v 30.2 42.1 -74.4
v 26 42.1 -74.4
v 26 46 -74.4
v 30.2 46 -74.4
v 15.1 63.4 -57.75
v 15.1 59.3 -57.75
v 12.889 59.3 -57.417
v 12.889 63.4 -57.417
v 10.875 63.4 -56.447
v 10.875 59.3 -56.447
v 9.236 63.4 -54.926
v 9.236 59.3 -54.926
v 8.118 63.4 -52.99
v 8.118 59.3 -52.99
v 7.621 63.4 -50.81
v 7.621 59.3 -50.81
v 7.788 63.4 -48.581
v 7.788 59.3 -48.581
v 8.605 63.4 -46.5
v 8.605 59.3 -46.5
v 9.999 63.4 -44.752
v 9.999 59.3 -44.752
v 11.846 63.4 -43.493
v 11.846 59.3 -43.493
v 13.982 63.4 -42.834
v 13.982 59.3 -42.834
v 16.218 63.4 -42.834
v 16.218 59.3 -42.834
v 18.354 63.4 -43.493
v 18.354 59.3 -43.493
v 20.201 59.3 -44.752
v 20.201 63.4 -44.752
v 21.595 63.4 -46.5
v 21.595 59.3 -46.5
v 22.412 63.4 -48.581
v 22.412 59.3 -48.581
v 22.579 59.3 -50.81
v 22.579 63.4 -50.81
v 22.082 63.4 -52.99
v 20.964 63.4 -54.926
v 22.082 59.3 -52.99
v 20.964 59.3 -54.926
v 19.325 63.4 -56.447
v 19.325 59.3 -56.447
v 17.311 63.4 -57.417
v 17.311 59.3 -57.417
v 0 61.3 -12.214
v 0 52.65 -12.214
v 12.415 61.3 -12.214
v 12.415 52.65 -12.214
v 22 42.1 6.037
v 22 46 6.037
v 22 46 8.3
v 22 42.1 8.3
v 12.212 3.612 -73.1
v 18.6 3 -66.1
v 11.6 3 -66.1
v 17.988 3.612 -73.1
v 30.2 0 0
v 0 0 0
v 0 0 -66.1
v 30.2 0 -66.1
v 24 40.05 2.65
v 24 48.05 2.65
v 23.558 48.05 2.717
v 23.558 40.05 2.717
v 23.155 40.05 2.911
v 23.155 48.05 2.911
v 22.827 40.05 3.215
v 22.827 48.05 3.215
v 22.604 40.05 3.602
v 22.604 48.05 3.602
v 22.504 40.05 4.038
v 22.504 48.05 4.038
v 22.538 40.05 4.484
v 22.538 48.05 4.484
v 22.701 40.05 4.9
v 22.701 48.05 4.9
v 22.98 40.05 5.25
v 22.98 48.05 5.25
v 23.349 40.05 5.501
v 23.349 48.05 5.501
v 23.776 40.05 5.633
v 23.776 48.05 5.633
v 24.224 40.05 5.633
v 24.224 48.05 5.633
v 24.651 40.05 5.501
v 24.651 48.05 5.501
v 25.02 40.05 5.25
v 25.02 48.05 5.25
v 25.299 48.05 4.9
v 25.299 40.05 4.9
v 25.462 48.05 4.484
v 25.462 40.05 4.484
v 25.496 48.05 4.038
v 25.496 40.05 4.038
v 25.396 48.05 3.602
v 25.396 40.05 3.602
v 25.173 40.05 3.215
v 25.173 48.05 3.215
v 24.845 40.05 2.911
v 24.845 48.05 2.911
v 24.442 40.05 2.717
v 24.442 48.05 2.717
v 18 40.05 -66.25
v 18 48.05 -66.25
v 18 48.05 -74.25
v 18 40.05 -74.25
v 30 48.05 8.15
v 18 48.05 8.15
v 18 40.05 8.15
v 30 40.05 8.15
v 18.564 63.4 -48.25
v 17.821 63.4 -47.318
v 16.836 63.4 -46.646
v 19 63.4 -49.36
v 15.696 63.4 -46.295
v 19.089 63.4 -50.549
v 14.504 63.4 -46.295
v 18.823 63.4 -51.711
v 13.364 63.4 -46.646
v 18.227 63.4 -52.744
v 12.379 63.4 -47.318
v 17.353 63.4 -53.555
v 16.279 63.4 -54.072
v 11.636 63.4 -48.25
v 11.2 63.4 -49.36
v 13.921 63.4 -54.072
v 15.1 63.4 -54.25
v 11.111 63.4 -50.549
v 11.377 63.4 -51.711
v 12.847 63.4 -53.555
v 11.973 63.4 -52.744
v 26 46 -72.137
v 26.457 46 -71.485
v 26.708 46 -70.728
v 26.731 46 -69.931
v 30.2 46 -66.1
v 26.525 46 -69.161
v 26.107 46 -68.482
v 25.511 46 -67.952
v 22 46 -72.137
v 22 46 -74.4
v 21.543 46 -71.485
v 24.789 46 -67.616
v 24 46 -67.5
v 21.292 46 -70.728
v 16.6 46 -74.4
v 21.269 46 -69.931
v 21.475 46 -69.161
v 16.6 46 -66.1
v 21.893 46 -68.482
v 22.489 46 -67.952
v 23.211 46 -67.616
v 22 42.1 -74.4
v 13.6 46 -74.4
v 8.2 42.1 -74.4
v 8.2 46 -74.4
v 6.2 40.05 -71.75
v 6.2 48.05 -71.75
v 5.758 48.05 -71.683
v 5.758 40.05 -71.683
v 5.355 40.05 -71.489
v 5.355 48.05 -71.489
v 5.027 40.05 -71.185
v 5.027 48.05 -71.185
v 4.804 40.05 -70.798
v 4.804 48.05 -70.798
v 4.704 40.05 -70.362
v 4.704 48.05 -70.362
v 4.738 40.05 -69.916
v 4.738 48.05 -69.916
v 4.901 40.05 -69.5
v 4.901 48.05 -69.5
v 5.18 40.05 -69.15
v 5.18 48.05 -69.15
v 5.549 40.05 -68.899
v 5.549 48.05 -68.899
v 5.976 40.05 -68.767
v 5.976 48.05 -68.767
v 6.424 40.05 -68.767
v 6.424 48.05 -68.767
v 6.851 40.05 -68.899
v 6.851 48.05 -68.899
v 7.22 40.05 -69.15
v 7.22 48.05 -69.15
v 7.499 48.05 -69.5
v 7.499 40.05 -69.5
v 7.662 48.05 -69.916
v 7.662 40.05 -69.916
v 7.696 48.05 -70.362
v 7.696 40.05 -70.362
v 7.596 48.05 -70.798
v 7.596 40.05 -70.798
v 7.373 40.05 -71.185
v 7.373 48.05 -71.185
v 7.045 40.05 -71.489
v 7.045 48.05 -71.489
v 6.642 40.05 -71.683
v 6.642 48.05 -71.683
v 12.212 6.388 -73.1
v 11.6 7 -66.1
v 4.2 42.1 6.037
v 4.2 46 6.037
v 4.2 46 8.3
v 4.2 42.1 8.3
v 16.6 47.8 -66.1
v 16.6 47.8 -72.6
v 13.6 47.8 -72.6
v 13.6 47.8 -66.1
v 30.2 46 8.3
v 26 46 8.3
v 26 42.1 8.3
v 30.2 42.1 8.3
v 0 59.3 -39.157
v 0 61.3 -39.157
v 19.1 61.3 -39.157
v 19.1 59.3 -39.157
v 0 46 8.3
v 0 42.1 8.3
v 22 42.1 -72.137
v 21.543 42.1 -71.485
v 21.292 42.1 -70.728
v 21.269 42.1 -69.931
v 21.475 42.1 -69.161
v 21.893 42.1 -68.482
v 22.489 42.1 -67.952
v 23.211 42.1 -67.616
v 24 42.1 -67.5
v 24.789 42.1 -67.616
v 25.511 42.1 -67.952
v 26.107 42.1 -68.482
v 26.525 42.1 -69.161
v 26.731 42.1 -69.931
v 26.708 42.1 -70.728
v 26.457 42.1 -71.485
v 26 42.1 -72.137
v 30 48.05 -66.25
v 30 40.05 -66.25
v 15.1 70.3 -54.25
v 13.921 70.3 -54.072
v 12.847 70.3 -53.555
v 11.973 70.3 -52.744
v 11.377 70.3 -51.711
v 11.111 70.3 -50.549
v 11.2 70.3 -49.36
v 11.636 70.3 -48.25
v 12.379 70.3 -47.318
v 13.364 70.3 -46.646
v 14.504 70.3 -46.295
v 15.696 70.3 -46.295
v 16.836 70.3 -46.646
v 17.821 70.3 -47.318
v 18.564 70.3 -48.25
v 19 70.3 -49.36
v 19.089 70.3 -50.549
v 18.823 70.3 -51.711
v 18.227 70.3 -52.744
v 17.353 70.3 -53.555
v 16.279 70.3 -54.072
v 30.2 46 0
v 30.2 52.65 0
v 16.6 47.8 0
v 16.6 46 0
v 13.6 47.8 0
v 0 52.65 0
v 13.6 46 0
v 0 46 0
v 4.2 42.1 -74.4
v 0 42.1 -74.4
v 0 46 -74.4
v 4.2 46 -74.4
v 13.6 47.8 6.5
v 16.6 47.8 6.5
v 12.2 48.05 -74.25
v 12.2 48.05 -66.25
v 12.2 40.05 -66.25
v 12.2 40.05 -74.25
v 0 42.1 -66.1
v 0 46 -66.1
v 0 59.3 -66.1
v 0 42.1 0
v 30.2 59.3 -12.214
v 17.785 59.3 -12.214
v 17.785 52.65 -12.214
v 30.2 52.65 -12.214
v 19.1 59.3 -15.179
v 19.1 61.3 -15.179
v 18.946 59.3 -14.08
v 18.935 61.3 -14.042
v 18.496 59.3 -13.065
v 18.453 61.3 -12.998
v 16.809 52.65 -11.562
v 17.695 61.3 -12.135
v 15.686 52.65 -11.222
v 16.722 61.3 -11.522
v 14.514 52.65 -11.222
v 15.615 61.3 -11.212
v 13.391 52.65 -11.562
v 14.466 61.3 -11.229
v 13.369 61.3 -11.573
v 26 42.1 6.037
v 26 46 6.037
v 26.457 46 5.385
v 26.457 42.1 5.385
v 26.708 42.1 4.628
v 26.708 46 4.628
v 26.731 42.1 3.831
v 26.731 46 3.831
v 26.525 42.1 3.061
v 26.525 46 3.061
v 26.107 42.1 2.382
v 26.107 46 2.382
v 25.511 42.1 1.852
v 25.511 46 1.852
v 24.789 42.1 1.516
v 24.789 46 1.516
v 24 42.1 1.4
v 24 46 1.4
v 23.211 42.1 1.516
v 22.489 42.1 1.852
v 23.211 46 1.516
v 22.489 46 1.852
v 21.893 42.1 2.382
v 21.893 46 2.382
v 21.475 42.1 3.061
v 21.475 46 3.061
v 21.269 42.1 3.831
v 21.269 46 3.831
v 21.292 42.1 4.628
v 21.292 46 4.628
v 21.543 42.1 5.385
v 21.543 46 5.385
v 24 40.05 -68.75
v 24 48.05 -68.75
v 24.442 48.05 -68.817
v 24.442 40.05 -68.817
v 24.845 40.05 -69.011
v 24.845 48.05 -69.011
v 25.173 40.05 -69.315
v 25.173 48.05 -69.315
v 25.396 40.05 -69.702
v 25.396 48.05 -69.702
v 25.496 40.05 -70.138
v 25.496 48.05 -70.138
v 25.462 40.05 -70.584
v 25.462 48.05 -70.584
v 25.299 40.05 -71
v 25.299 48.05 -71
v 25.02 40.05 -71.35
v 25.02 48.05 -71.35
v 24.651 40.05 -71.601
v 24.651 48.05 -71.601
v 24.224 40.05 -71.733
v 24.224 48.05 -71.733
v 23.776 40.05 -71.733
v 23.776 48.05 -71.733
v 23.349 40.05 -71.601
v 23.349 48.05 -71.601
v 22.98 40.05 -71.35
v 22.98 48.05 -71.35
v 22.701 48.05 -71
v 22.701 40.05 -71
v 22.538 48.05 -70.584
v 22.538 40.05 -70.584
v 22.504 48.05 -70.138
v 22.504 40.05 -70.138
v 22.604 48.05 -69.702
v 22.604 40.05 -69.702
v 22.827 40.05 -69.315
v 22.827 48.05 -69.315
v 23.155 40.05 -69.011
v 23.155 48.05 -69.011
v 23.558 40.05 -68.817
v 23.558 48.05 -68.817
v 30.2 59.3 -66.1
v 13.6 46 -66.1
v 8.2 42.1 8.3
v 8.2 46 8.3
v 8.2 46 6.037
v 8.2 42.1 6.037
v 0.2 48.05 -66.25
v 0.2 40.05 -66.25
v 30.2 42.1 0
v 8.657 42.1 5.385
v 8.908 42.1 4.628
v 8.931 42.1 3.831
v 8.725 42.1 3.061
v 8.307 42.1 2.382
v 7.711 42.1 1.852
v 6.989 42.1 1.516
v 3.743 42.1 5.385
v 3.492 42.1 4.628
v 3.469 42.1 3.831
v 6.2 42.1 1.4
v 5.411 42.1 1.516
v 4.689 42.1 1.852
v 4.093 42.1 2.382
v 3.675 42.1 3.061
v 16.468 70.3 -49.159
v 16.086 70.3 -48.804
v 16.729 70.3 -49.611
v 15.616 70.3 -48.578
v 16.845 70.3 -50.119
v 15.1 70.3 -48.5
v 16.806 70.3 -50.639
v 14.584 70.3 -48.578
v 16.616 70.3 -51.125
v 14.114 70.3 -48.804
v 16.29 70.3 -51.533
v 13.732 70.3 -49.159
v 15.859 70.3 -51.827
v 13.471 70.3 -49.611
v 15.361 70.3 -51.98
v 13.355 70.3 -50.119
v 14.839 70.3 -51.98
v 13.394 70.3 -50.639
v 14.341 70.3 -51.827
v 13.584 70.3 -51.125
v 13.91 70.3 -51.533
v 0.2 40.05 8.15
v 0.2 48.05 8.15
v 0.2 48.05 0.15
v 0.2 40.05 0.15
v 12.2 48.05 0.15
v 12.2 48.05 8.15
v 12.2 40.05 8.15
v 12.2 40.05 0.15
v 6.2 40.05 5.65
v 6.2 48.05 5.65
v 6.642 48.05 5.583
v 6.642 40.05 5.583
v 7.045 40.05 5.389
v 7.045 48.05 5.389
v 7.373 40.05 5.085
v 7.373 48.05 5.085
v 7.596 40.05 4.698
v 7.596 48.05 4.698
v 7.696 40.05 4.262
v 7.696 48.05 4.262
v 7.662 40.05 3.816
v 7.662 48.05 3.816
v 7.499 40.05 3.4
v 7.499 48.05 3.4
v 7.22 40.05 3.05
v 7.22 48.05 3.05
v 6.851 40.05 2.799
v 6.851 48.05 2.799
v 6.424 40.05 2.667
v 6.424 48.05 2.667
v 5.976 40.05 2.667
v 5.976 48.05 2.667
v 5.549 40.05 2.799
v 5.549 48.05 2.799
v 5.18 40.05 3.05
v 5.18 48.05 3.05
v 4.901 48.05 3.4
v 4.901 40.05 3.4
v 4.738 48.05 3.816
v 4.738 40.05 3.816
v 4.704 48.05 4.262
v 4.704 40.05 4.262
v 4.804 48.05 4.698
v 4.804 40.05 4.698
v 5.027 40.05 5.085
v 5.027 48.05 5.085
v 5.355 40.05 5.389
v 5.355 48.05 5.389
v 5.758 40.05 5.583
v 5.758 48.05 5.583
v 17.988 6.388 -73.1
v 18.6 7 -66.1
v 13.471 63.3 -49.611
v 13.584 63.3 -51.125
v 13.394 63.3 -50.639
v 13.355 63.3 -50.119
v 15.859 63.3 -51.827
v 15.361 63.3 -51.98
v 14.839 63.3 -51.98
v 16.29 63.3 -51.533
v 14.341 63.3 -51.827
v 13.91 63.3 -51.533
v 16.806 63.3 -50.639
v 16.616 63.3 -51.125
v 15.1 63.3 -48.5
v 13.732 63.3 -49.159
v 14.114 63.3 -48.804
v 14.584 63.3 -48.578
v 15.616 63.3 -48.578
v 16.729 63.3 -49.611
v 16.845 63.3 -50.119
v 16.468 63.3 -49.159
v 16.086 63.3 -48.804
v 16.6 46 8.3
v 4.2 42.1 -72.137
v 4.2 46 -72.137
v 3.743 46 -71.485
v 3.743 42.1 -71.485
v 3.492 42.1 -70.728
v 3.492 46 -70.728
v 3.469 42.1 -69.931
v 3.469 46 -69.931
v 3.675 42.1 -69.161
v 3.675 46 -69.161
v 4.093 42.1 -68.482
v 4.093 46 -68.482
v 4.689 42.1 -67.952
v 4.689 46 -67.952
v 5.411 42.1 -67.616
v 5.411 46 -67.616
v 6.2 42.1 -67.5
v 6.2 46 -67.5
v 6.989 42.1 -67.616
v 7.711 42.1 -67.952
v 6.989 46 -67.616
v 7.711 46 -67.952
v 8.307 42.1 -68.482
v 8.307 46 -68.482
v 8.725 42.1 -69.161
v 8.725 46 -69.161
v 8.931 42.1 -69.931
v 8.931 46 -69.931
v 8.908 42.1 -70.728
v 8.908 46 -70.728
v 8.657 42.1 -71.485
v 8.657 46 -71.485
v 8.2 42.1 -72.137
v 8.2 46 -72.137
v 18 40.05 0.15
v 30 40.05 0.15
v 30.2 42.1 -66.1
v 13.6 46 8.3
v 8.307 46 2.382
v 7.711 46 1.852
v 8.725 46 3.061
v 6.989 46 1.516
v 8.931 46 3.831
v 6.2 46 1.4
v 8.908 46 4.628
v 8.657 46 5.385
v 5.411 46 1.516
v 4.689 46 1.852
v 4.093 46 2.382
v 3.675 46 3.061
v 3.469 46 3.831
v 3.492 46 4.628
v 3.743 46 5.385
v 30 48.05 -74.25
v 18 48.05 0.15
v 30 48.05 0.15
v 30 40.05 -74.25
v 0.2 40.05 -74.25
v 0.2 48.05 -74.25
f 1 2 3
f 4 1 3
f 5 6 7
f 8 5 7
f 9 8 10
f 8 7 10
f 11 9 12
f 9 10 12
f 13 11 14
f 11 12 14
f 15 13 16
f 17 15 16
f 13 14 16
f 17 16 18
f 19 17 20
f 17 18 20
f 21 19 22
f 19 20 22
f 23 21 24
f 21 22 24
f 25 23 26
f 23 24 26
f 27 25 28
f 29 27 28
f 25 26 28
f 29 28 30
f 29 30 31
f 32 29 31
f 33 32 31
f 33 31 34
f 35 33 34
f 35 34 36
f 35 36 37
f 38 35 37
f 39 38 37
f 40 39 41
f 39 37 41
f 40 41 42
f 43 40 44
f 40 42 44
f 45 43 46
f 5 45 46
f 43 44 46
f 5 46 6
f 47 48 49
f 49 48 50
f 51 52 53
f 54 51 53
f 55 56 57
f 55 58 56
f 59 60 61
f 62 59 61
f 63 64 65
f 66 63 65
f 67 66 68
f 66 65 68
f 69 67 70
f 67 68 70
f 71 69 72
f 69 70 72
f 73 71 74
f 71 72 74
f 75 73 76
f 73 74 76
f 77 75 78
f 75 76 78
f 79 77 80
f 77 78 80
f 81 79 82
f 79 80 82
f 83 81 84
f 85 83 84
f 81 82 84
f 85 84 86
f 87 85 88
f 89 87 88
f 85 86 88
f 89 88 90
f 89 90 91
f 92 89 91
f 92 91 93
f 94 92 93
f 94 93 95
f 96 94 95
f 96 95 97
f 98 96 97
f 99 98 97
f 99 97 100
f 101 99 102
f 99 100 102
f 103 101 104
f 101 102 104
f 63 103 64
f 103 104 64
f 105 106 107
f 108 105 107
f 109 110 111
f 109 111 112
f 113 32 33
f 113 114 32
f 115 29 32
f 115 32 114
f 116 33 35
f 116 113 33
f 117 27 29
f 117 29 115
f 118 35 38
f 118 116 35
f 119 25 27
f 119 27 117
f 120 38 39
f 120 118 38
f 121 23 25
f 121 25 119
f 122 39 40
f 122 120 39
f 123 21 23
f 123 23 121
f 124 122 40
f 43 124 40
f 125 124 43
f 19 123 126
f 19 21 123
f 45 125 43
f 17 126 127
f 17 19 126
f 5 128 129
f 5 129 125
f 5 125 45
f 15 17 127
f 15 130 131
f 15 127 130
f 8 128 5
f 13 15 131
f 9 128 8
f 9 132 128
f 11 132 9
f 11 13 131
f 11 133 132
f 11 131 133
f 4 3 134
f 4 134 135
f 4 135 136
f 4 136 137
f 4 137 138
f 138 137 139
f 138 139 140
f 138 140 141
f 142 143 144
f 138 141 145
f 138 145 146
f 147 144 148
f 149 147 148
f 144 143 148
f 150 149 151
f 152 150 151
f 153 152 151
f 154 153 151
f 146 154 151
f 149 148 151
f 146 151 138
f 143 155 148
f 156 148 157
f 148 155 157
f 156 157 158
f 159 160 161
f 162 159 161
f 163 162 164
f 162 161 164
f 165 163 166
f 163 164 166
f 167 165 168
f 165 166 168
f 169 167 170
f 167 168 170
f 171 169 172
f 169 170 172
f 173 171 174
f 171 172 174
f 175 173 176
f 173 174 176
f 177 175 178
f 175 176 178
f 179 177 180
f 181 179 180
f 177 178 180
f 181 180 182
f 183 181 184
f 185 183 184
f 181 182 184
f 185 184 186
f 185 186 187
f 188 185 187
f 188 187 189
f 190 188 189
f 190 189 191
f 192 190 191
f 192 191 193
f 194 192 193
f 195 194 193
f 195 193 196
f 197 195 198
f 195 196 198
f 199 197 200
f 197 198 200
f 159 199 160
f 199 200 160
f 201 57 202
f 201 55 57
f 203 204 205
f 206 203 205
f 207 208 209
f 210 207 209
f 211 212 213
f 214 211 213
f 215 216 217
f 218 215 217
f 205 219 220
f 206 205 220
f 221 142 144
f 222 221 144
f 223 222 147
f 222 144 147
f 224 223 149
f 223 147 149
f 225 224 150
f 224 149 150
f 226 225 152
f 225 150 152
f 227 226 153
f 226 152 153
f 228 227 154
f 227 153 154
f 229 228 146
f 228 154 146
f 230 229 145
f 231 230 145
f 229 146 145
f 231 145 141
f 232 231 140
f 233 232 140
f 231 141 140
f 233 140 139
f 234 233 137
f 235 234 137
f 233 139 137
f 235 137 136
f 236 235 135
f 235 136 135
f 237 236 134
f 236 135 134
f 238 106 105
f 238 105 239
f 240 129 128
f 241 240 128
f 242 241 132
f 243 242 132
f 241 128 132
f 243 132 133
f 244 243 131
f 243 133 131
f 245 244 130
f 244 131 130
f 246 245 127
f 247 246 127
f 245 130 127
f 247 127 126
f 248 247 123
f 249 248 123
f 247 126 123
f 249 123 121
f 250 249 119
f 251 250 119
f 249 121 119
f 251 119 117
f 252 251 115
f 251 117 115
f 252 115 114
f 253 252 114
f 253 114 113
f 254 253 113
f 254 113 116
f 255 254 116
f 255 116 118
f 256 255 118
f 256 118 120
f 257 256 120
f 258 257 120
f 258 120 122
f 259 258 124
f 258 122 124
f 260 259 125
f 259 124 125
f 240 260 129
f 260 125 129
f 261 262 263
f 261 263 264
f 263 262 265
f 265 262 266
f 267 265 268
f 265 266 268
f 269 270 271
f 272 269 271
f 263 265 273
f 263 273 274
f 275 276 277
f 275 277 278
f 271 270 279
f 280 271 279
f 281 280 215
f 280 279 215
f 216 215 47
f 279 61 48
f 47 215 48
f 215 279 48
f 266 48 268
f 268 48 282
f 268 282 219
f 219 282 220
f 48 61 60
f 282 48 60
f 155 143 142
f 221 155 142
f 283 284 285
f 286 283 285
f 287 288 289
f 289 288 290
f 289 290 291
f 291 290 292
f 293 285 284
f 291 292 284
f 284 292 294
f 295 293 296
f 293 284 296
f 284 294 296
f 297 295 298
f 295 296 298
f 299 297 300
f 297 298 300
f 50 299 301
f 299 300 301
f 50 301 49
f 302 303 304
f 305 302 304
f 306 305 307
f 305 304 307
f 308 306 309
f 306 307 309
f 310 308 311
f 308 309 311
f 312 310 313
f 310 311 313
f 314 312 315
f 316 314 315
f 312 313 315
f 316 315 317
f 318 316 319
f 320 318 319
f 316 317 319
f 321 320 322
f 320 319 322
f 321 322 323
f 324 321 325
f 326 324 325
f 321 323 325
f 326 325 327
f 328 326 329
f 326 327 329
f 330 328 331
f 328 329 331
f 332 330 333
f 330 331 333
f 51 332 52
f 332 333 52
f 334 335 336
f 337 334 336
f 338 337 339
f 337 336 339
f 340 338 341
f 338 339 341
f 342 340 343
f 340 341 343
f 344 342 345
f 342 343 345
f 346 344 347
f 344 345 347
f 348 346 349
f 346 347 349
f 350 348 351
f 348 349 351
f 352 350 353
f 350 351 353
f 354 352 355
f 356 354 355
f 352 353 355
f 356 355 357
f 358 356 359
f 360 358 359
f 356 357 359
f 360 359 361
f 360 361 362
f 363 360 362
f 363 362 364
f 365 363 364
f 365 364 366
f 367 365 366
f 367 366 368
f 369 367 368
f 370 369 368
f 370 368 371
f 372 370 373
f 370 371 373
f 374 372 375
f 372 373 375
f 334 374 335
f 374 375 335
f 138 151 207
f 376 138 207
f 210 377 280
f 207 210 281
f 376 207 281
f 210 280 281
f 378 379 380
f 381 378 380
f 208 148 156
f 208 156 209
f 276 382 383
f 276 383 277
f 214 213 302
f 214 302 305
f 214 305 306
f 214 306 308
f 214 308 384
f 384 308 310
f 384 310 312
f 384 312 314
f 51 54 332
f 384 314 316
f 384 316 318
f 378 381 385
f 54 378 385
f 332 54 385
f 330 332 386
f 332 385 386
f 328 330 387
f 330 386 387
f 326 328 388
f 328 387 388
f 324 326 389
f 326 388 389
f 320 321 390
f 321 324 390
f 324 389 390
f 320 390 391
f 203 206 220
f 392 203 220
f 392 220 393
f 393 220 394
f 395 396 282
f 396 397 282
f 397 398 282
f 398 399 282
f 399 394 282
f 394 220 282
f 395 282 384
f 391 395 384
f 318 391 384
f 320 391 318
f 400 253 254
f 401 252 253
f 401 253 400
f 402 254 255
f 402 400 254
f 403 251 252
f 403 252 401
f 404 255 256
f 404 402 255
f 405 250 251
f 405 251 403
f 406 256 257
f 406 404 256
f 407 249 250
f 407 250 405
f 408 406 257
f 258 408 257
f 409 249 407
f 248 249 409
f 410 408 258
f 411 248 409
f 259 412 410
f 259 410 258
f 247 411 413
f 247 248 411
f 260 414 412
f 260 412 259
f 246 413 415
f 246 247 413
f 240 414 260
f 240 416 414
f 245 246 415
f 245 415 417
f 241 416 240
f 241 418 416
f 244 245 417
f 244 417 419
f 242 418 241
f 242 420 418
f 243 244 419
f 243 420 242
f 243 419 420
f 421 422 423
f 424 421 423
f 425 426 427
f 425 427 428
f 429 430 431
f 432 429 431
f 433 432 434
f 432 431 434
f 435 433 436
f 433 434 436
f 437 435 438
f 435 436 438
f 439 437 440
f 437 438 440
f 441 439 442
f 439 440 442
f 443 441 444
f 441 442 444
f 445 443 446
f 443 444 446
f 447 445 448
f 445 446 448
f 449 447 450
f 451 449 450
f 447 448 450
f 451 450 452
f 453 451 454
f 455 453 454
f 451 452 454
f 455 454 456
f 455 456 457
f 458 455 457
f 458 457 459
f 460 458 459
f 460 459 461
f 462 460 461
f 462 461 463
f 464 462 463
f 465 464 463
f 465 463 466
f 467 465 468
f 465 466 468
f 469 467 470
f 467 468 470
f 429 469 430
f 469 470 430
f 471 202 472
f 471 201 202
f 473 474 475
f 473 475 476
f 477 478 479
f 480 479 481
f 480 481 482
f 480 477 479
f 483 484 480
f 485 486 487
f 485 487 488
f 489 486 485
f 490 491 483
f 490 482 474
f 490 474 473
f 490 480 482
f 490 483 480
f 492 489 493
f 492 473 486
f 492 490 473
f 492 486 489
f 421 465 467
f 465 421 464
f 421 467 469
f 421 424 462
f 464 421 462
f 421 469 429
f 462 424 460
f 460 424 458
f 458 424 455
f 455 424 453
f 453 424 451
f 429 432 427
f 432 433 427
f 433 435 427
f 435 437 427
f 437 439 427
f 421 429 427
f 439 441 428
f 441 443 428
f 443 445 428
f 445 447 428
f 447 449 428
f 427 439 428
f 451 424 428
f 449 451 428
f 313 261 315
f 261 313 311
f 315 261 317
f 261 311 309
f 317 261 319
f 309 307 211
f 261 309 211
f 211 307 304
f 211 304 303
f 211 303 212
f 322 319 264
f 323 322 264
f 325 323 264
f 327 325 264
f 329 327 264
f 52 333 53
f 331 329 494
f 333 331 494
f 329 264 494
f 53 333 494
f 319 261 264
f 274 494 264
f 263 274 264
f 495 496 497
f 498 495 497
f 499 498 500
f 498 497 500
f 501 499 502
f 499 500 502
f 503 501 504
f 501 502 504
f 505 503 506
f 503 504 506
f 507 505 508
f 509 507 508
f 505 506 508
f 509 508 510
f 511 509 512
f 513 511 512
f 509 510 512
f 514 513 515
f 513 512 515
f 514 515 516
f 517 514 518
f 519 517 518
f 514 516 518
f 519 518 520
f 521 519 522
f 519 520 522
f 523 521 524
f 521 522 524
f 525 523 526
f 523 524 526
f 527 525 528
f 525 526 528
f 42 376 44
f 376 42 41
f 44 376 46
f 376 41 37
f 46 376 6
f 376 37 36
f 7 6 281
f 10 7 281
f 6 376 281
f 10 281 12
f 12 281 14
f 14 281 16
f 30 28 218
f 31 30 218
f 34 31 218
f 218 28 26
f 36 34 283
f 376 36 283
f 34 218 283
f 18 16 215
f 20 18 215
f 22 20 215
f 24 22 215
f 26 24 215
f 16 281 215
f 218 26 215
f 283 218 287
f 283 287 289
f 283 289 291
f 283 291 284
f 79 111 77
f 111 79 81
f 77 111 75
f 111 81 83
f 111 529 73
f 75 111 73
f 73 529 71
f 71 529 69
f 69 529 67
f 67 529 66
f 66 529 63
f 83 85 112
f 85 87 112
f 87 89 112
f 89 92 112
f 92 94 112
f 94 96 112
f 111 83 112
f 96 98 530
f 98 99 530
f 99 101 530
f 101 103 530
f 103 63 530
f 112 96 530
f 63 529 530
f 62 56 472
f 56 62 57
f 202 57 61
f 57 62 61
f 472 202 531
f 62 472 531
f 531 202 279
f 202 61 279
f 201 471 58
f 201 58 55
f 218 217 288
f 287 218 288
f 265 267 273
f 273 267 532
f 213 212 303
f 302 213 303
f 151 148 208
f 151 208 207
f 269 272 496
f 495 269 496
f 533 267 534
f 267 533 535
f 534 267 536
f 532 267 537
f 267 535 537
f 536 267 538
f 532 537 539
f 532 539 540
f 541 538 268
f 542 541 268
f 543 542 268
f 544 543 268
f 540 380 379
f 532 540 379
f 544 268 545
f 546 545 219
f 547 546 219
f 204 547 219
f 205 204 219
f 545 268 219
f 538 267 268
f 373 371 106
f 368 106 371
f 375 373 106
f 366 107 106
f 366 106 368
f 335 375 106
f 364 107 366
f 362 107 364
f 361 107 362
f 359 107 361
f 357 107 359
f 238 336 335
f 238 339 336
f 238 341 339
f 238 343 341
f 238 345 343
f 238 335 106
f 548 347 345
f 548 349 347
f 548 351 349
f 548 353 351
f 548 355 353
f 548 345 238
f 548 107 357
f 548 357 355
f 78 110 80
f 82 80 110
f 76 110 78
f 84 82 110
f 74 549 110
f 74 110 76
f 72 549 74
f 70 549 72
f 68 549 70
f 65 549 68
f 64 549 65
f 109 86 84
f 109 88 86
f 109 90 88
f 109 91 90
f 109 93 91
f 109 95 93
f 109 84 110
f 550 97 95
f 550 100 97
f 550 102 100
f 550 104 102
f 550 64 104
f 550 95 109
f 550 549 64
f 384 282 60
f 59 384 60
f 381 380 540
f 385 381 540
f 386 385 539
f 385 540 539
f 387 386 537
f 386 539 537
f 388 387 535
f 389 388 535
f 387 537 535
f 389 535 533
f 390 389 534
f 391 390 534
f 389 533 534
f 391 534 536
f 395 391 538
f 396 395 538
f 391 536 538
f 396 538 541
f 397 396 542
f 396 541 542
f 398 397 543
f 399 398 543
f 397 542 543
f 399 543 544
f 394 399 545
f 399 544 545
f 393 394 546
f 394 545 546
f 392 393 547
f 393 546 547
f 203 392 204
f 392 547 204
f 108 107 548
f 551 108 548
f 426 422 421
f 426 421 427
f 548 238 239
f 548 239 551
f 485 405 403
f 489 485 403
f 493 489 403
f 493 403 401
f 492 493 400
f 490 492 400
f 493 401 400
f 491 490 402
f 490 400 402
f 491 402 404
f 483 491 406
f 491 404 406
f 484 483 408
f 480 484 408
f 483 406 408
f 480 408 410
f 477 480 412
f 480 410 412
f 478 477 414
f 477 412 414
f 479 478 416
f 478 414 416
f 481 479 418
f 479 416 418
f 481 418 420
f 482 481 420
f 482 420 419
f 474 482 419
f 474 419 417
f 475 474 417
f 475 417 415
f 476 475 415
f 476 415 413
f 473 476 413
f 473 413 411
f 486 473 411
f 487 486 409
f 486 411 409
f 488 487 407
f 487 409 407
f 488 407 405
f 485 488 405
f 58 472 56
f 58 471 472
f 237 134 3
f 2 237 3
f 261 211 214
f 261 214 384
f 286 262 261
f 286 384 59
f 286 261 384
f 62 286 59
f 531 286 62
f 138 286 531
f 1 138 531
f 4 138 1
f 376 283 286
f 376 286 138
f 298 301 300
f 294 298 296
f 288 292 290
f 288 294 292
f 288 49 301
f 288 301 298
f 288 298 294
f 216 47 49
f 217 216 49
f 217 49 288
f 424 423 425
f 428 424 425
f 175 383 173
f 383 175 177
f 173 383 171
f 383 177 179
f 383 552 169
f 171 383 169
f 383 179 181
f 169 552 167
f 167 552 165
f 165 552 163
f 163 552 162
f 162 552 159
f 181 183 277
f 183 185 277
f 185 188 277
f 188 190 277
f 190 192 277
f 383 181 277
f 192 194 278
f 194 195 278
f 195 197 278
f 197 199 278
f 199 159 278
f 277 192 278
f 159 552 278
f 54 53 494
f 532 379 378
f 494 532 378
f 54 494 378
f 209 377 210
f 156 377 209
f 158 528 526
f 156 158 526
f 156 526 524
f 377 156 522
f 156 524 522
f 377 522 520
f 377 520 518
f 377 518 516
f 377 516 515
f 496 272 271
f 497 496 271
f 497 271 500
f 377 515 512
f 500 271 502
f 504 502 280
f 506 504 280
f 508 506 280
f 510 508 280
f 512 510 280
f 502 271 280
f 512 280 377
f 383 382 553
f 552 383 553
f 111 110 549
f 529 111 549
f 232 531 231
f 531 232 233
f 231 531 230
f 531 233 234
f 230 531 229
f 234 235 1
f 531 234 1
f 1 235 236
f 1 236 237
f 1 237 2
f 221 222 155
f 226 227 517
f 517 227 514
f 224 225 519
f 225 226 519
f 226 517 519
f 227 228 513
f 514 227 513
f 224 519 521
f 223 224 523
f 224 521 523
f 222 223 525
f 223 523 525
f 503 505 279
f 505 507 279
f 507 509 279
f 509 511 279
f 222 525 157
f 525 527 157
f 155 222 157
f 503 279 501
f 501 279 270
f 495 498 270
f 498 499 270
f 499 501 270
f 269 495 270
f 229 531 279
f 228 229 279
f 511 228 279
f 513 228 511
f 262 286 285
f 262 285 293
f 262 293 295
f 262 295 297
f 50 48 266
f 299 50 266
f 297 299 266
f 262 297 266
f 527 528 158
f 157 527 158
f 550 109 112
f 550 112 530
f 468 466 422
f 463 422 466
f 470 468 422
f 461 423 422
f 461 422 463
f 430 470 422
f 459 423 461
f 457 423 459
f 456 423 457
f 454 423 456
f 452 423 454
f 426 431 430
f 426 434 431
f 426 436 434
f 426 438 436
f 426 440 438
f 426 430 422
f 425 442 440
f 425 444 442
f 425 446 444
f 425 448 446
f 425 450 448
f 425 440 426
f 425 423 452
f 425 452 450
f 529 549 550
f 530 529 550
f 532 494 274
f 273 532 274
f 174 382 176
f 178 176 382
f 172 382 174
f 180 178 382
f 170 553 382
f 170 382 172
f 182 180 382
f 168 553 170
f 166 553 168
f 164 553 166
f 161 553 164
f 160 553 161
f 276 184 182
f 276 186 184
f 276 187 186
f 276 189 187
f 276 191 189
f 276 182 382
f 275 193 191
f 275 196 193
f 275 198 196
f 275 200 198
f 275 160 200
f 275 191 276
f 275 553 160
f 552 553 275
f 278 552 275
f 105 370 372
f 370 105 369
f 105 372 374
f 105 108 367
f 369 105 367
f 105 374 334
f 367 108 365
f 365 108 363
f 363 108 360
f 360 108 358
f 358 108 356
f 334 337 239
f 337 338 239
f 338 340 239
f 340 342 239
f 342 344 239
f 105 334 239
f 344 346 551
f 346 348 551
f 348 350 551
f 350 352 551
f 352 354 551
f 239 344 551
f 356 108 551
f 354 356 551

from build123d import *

# Parameters (mm, degrees)
BOSS_EXTRUDE1_DEPTH  = 30.2
CUT_EXTRUDE3_DEPTH   = 6.9
SKETCH10_R           = 7.5
BOSS_EXTRUDE6_DEPTH  = 4.1
SKETCH11_R           = 4
BOSS_EXTRUDE7_DEPTH  = 6.9
BOSS_EXTRUDE8_DEPTH  = 8.9
BOSS_EXTRUDE9_DEPTH  = 2
BOSS_EXTRUDE10_DEPTH = 1.8
CUT_EXTRUDE5_DEPTH   = 4
SKETCH23_R           = 1.75
CUT_EXTRUDE6_DEPTH   = 7
ESQUISSE1_W          = 7
ESQUISSE1_H          = 4
BOSS_EXTRU_1_DEPTH   = 7
BOSS_EXTRU_1_TAPER   = 5
BOSS_EXTRU_2_START   = 2.05
ESQUISSE2_W          = 12
ESQUISSE2_H          = 8
ESQUISSE2_R          = 1.5
BOSS_EXTRU_2_DEPTH   = 8
BOSS_EXTRU_2_2_DEPTH = 8
BOSS_EXTRU_2_3_DEPTH = 8
BOSS_EXTRU_2_4_DEPTH = 8


with BuildPart() as part:
    # Sketch1 → Boss-Extrude1 (new body)
    with BuildSketch(Plane(origin=(0, 0, 0), x_dir=(0, 0, -1), z_dir=(1, 0, 0))):
        Polygon((0, 0), (66.1, 0), (66.1, 42.1), (74.4, 42.1), (74.4, 46), (66.1, 46), (66.1, 59.3), (12.213560369, 59.3), (12.213560369, 52.65), (0, 52.65), (0, 46), (-8.3, 46), (-8.3, 42.1), (0, 42.1), align=None)
    extrude(amount=BOSS_EXTRUDE1_DEPTH)

    # Sketch9 → Cut-Extrude3 (cut)
    with BuildSketch(Plane(origin=(0, 46, 0), x_dir=(1, 0, 0), z_dir=(0, 1, 0))):
        with BuildLine():
            Line((22, 74.4), (22, 72.137458609))
            ThreePointArc((22, 72.137458609), (24, 67.5), (26, 72.137458609))
            Line((26, 72.137458609), (26, 74.4))
            Line((26, 74.4), (24, 74.4))
            Line((24, 74.4), (22, 74.4))
        make_face()
        with BuildLine():
            Line((6.2, 74.4), (4.2, 74.4))
            Line((4.2, 74.4), (4.2, 72.137458609))
            ThreePointArc((4.2, 72.137458609), (6.2, 67.5), (8.2, 72.137458609))
            Line((8.2, 72.137458609), (8.2, 74.4))
            Line((8.2, 74.4), (6.2, 74.4))
        make_face()
        with BuildLine():
            Line((24, -8.3), (26, -8.3))
            Line((26, -8.3), (26, -6.037458609))
            ThreePointArc((26, -6.037458609), (24, -1.4), (22, -6.037458609))
            Line((22, -6.037458609), (22, -8.3))
            Line((22, -8.3), (24, -8.3))
        make_face()
        with BuildLine():
            Line((8.2, -8.3), (8.2, -6.037458609))
            ThreePointArc((8.2, -6.037458609), (6.2, -1.4), (4.2, -6.037458609))
            Line((4.2, -6.037458609), (4.2, -8.3))
            Line((4.2, -8.3), (6.2, -8.3))
            Line((6.2, -8.3), (8.2, -8.3))
        make_face()
    extrude(amount=-CUT_EXTRUDE3_DEPTH, mode=Mode.SUBTRACT)

    # Sketch10 → Boss-Extrude6 (add)
    with BuildSketch(Plane(origin=(0, 59.3, 0), x_dir=(1, 0, 0), z_dir=(0, 1, 0))):
        with Locations(Location((15.1, 50.25, 0), (0, 0, 90))):
            Circle(SKETCH10_R)
    extrude(amount=BOSS_EXTRUDE6_DEPTH)

    # Sketch11 → Boss-Extrude7 (add)
    with BuildSketch(Plane(origin=(0, 63.4, 0), x_dir=(1, 0, 0), z_dir=(0, 1, 0))):
        with Locations(Location((15.1, 50.25, 0), (0, 0, 90))):
            Circle(SKETCH11_R)
    extrude(amount=BOSS_EXTRUDE7_DEPTH)

    # Sketch14 → Boss-Extrude8 (add)
    with BuildSketch(Plane(origin=(0, 61.3, 0), x_dir=(1, 0, 0), z_dir=(0, 1, 0))):
        with BuildLine():
            Line((0, 39.156780185), (15.1, 39.156780185))
            Line((15.1, 39.156780185), (19.1, 39.156780185))
            Line((19.1, 39.156780185), (19.1, 15.178872415))
            ThreePointArc((19.1, 15.178872415), (15.1, 11.178872415), (11.1, 15.178872415))
            Line((11.1, 15.178872415), (0, 15.178872415))
            Line((0, 15.178872415), (0, 39.156780185))
        make_face()
    extrude(amount=-BOSS_EXTRUDE8_DEPTH)

    # Sketch17 → Boss-Extrude9 (add)
    with BuildSketch(Plane(origin=(0, 59.3, 0), x_dir=(1, 0, 0), z_dir=(0, 1, 0))):
        Polygon((0, 12.213560369), (15.153721143, 12.213560369), (15.1, 15.178872415), (0, 15.178872415), align=None)
    extrude(amount=BOSS_EXTRUDE9_DEPTH)

    # Sketch18 → Boss-Extrude10 (add)
    with BuildSketch(Plane(origin=(0, 46, 0), x_dir=(1, 0, 0), z_dir=(0, 1, 0))):
        Polygon((15.1, 74.4), (16.6, 74.4), (16.6, 66.1), (13.6, 66.1), (13.6, 74.4), align=None)
        Polygon((13.6, -8.3), (15.1, -8.3), (16.6, -8.3), (16.6, 0), (13.6, 0), align=None)
    extrude(amount=BOSS_EXTRUDE10_DEPTH)

    # Sketch22 → Cut-Extrude5 (cut)
    with BuildSketch(Plane(origin=(16.6, 0, 0), x_dir=(0, 0, -1), z_dir=(1, 0, 0))):
        Polygon((74.4, 46), (72.6, 47.8), (74.4, 47.8), align=None)
        Polygon((-8.3, 47.8), (-8.3, 46), (-6.5, 47.8), align=None)
    extrude(amount=-CUT_EXTRUDE5_DEPTH, mode=Mode.SUBTRACT)

    # Sketch23 → Cut-Extrude6 (cut)
    with BuildSketch(Plane(origin=(0, 70.3, 0), x_dir=(1, 0, 0), z_dir=(0, 1, 0))):
        with Locations(Location((15.1, 50.25, 0), (0, 0, 270))):
            Circle(SKETCH23_R)
    extrude(amount=-CUT_EXTRUDE6_DEPTH, mode=Mode.SUBTRACT)

    # Esquisse1 → Boss.-Extru.1 (add)
    with BuildSketch(Plane(origin=(0, 0, -66.1), x_dir=(-1, 0, 0), z_dir=(0, 0, -1))):
        with Locations((-15.1, 5)):
            Rectangle(ESQUISSE1_W, ESQUISSE1_H)
    extrude(amount=BOSS_EXTRU_1_DEPTH, taper=BOSS_EXTRU_1_TAPER)


with BuildPart() as body_2:
    # Esquisse2 → Boss.-Extru.2 (new body)
    with BuildSketch(Plane(origin=(0, 46, 0), x_dir=(1, 0, 0), z_dir=(0, 1, 0)).offset(BOSS_EXTRU_2_START)):
        with Locations((6.2, -4.15)):
            Rectangle(ESQUISSE2_W, ESQUISSE2_H)
        with Locations(Location((6.2, -4.15, 0), (0, 0, 270))):
            Circle(ESQUISSE2_R, mode=Mode.SUBTRACT)
    extrude(amount=-BOSS_EXTRU_2_DEPTH)


with BuildPart() as body_3:
    # Esquisse2 → Boss.-Extru.2 2 (new body)
    with BuildSketch(Plane(origin=(0, 46, 0), x_dir=(1, 0, 0), z_dir=(0, 1, 0)).offset(BOSS_EXTRU_2_START)):
        with Locations((24, -4.15)):
            Rectangle(ESQUISSE2_W, ESQUISSE2_H)
        with Locations(Location((24, -4.15, 0), (0, 0, 90))):
            Circle(ESQUISSE2_R, mode=Mode.SUBTRACT)
    extrude(amount=-BOSS_EXTRU_2_2_DEPTH)


with BuildPart() as body_4:
    # Esquisse2 → Boss.-Extru.2 3 (new body)
    with BuildSketch(Plane(origin=(0, 46, 0), x_dir=(1, 0, 0), z_dir=(0, 1, 0)).offset(BOSS_EXTRU_2_START)):
        with Locations((24, 70.25)):
            Rectangle(ESQUISSE2_W, ESQUISSE2_H)
        with Locations(Location((24, 70.25, 0), (0, 0, 270))):
            Circle(ESQUISSE2_R, mode=Mode.SUBTRACT)
    extrude(amount=-BOSS_EXTRU_2_3_DEPTH)


with BuildPart() as body_5:
    # Esquisse2 → Boss.-Extru.2 4 (new body)
    with BuildSketch(Plane(origin=(0, 46, 0), x_dir=(1, 0, 0), z_dir=(0, 1, 0)).offset(BOSS_EXTRU_2_START)):
        with Locations((6.2, 70.25)):
            Rectangle(ESQUISSE2_W, ESQUISSE2_H)
        with Locations(Location((6.2, 70.25, 0), (0, 0, 90))):
            Circle(ESQUISSE2_R, mode=Mode.SUBTRACT)
    extrude(amount=-BOSS_EXTRU_2_4_DEPTH)


solid = Compound([part.part, body_2.part, body_3.part, body_4.part, body_5.part])
